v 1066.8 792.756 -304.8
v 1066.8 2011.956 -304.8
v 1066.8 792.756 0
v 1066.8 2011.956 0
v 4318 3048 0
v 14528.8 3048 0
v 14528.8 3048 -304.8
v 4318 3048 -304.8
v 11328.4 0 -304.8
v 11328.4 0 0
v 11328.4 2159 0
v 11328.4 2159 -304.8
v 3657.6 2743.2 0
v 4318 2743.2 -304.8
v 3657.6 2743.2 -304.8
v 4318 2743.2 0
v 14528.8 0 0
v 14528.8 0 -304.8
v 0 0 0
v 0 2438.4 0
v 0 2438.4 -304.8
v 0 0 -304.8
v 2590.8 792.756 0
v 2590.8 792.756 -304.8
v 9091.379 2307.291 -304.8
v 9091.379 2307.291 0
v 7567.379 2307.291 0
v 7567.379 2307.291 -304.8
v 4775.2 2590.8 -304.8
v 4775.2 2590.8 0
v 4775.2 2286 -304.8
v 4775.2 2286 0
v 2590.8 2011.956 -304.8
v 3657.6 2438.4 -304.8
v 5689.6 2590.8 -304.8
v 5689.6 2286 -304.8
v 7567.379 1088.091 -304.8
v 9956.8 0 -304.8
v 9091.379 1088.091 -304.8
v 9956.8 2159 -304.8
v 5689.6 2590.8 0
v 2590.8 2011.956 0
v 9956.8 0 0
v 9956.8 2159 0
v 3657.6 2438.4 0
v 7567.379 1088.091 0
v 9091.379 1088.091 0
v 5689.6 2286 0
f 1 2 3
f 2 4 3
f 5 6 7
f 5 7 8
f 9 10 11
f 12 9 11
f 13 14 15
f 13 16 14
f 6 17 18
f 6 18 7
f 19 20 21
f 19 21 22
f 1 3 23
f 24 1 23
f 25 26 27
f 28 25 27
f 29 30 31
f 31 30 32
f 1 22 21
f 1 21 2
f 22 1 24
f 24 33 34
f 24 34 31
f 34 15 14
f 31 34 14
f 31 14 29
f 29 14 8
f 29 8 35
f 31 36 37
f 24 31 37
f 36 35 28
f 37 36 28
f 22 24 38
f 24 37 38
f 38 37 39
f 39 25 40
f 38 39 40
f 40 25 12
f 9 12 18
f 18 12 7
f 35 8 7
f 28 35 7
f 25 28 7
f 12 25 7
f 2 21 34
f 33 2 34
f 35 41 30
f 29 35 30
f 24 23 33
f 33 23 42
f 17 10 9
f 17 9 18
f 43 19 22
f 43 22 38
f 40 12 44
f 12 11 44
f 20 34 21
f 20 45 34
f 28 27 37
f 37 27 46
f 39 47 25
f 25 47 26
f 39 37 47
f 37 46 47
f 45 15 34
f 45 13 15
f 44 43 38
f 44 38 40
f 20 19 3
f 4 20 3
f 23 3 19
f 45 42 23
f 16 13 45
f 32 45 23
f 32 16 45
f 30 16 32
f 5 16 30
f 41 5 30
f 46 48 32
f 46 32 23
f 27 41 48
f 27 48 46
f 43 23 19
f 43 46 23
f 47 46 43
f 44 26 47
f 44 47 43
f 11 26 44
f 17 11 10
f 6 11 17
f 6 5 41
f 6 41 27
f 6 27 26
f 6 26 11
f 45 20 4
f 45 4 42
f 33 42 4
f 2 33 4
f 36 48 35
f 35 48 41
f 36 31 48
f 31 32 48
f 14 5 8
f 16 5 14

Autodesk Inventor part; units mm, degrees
ref_plane "YZ Plane" through (0, 0, 0) normal (1, 0, 0) x (0, 1, 0)
ref_plane "XZ Plane" through (0, 0, 0) normal (0, 1, 0) x (-1, 0, 0)
ref_plane "XY Plane" through (0, 0, 0) normal (0, 0, 1) x (1, 0, 0)
sketch "Sketch1" plane through (0, 0, 0) normal (0, 0, 1) x (1, 0, 0)
  line L0 (0, 0) -> (3657.6, 0)
  line L1 (3657.6, 0) -> (3657.6, 2438.4)
  line L2 (3657.6, 2438.4) -> (0, 2438.4)
  line L3 (0, 2438.4) -> (0, 0)
  line L4 (3657.6, 0) -> (4318, 0)
  line L5 (4318, 2743.2) -> (3657.6, 2743.2)
  line L6 (3657.6, 2743.2) -> (3657.6, 0)
  line L7 (4318, 0) -> (9956.8, 0)
  line L8 (9956.8, 0) -> (9956.8, 2159)
  line L9 (9956.8, 3048) -> (4318, 3048)
  line L10 (4318, 3048) -> (4318, 0)
  line L11 (9956.8, 0) -> (11328.4, 0)
  line L12 (11328.4, 0) -> (11328.4, 2159)
  line L13 (11328.4, 2159) -> (9956.8, 2159)
  line L14 (9956.8, 2159) -> (9956.8, 0)
  line L15 (9956.8, 0) -> (14528.8, 0)
  line L16 (14528.8, 0) -> (14528.8, 3048)
  line L17 (14528.8, 3048) -> (9956.8, 3048)
  line L18 (9956.8, 3048) -> (9956.8, 0)
  line L19 (4775.2, 2286) -> (5689.6, 2286)
  line L20 (5689.6, 2286) -> (5689.6, 2590.8)
  line L21 (5689.6, 2590.8) -> (4775.2, 2590.8)
  line L22 (4775.2, 2590.8) -> (4775.2, 2286)
  line L23 (4775.2, 2286) -> (5689.6, 2590.8) construction
  line L24 (5689.6, 2286) -> (4775.2, 2590.8) construction
  line L25 (7567.3793, 1088.0908) -> (9091.3793, 1088.0908)
  line L26 (9091.3793, 1088.0908) -> (9091.3793, 2307.2908)
  line L27 (9091.3793, 2307.2908) -> (7567.3793, 2307.2908)
  line L28 (7567.3793, 2307.2908) -> (7567.3793, 1088.0908)
  line L29 (7567.3793, 1088.0908) -> (9091.3793, 2307.2908) construction
  line L30 (9091.3793, 1088.0908) -> (7567.3793, 2307.2908) construction
  line L31 (1066.8, 792.7558) -> (2590.8, 792.7558)
  line L32 (2590.8, 792.7558) -> (2590.8, 2011.9558)
  line L33 (2590.8, 2011.9558) -> (1066.8, 2011.9558)
  line L34 (1066.8, 2011.9558) -> (1066.8, 792.7558)
  line L35 (1066.8, 792.7558) -> (2590.8, 2011.9558) construction
  line L36 (2590.8, 792.7558) -> (1066.8, 2011.9558) construction
  line L37 (4318, 0) -> (4318, 2159)
  line L38 (4318, 2286) -> (4318, 2743.2)
  point P0 (5232.4, 2438.4)
  point P1 (8329.3793, 1697.6908)
  point P2 (1828.8, 1402.3558)
  dimension "d0" = 3657.6
  dimension "d1" = 2438.4
  dimension "d2" = 660.4
  dimension "d3" = 2743.2
  dimension "d4" = 5638.8
  dimension "d5" = 3048
  dimension "d6" = 1371.6
  dimension "d7" = 2159
  dimension "d8" = 4572
  dimension "d9" = 3048
  dimension "d10" = 304.8
  dimension "d11" = 914.4
  dimension "d14" = 1524
  dimension "d15" = 1219.2
  dimension "d16" = 1524
  dimension "d17" = 1219.2
  dimension "d18" = 1828.8
  dimension "d19" = 3200.4
  dimension "d22" = 14528.8
extrude "Extrusion1" add sketch "Sketch1" against normal blind 304.8 contours L3 L2 L1 L0 | L1 L6 L5 L10 L4 | L10 L9 L18 L8 L7 | L18 L17 L16 L15 L12 L13
properties part number "westSideofHouseFacingGarage"
